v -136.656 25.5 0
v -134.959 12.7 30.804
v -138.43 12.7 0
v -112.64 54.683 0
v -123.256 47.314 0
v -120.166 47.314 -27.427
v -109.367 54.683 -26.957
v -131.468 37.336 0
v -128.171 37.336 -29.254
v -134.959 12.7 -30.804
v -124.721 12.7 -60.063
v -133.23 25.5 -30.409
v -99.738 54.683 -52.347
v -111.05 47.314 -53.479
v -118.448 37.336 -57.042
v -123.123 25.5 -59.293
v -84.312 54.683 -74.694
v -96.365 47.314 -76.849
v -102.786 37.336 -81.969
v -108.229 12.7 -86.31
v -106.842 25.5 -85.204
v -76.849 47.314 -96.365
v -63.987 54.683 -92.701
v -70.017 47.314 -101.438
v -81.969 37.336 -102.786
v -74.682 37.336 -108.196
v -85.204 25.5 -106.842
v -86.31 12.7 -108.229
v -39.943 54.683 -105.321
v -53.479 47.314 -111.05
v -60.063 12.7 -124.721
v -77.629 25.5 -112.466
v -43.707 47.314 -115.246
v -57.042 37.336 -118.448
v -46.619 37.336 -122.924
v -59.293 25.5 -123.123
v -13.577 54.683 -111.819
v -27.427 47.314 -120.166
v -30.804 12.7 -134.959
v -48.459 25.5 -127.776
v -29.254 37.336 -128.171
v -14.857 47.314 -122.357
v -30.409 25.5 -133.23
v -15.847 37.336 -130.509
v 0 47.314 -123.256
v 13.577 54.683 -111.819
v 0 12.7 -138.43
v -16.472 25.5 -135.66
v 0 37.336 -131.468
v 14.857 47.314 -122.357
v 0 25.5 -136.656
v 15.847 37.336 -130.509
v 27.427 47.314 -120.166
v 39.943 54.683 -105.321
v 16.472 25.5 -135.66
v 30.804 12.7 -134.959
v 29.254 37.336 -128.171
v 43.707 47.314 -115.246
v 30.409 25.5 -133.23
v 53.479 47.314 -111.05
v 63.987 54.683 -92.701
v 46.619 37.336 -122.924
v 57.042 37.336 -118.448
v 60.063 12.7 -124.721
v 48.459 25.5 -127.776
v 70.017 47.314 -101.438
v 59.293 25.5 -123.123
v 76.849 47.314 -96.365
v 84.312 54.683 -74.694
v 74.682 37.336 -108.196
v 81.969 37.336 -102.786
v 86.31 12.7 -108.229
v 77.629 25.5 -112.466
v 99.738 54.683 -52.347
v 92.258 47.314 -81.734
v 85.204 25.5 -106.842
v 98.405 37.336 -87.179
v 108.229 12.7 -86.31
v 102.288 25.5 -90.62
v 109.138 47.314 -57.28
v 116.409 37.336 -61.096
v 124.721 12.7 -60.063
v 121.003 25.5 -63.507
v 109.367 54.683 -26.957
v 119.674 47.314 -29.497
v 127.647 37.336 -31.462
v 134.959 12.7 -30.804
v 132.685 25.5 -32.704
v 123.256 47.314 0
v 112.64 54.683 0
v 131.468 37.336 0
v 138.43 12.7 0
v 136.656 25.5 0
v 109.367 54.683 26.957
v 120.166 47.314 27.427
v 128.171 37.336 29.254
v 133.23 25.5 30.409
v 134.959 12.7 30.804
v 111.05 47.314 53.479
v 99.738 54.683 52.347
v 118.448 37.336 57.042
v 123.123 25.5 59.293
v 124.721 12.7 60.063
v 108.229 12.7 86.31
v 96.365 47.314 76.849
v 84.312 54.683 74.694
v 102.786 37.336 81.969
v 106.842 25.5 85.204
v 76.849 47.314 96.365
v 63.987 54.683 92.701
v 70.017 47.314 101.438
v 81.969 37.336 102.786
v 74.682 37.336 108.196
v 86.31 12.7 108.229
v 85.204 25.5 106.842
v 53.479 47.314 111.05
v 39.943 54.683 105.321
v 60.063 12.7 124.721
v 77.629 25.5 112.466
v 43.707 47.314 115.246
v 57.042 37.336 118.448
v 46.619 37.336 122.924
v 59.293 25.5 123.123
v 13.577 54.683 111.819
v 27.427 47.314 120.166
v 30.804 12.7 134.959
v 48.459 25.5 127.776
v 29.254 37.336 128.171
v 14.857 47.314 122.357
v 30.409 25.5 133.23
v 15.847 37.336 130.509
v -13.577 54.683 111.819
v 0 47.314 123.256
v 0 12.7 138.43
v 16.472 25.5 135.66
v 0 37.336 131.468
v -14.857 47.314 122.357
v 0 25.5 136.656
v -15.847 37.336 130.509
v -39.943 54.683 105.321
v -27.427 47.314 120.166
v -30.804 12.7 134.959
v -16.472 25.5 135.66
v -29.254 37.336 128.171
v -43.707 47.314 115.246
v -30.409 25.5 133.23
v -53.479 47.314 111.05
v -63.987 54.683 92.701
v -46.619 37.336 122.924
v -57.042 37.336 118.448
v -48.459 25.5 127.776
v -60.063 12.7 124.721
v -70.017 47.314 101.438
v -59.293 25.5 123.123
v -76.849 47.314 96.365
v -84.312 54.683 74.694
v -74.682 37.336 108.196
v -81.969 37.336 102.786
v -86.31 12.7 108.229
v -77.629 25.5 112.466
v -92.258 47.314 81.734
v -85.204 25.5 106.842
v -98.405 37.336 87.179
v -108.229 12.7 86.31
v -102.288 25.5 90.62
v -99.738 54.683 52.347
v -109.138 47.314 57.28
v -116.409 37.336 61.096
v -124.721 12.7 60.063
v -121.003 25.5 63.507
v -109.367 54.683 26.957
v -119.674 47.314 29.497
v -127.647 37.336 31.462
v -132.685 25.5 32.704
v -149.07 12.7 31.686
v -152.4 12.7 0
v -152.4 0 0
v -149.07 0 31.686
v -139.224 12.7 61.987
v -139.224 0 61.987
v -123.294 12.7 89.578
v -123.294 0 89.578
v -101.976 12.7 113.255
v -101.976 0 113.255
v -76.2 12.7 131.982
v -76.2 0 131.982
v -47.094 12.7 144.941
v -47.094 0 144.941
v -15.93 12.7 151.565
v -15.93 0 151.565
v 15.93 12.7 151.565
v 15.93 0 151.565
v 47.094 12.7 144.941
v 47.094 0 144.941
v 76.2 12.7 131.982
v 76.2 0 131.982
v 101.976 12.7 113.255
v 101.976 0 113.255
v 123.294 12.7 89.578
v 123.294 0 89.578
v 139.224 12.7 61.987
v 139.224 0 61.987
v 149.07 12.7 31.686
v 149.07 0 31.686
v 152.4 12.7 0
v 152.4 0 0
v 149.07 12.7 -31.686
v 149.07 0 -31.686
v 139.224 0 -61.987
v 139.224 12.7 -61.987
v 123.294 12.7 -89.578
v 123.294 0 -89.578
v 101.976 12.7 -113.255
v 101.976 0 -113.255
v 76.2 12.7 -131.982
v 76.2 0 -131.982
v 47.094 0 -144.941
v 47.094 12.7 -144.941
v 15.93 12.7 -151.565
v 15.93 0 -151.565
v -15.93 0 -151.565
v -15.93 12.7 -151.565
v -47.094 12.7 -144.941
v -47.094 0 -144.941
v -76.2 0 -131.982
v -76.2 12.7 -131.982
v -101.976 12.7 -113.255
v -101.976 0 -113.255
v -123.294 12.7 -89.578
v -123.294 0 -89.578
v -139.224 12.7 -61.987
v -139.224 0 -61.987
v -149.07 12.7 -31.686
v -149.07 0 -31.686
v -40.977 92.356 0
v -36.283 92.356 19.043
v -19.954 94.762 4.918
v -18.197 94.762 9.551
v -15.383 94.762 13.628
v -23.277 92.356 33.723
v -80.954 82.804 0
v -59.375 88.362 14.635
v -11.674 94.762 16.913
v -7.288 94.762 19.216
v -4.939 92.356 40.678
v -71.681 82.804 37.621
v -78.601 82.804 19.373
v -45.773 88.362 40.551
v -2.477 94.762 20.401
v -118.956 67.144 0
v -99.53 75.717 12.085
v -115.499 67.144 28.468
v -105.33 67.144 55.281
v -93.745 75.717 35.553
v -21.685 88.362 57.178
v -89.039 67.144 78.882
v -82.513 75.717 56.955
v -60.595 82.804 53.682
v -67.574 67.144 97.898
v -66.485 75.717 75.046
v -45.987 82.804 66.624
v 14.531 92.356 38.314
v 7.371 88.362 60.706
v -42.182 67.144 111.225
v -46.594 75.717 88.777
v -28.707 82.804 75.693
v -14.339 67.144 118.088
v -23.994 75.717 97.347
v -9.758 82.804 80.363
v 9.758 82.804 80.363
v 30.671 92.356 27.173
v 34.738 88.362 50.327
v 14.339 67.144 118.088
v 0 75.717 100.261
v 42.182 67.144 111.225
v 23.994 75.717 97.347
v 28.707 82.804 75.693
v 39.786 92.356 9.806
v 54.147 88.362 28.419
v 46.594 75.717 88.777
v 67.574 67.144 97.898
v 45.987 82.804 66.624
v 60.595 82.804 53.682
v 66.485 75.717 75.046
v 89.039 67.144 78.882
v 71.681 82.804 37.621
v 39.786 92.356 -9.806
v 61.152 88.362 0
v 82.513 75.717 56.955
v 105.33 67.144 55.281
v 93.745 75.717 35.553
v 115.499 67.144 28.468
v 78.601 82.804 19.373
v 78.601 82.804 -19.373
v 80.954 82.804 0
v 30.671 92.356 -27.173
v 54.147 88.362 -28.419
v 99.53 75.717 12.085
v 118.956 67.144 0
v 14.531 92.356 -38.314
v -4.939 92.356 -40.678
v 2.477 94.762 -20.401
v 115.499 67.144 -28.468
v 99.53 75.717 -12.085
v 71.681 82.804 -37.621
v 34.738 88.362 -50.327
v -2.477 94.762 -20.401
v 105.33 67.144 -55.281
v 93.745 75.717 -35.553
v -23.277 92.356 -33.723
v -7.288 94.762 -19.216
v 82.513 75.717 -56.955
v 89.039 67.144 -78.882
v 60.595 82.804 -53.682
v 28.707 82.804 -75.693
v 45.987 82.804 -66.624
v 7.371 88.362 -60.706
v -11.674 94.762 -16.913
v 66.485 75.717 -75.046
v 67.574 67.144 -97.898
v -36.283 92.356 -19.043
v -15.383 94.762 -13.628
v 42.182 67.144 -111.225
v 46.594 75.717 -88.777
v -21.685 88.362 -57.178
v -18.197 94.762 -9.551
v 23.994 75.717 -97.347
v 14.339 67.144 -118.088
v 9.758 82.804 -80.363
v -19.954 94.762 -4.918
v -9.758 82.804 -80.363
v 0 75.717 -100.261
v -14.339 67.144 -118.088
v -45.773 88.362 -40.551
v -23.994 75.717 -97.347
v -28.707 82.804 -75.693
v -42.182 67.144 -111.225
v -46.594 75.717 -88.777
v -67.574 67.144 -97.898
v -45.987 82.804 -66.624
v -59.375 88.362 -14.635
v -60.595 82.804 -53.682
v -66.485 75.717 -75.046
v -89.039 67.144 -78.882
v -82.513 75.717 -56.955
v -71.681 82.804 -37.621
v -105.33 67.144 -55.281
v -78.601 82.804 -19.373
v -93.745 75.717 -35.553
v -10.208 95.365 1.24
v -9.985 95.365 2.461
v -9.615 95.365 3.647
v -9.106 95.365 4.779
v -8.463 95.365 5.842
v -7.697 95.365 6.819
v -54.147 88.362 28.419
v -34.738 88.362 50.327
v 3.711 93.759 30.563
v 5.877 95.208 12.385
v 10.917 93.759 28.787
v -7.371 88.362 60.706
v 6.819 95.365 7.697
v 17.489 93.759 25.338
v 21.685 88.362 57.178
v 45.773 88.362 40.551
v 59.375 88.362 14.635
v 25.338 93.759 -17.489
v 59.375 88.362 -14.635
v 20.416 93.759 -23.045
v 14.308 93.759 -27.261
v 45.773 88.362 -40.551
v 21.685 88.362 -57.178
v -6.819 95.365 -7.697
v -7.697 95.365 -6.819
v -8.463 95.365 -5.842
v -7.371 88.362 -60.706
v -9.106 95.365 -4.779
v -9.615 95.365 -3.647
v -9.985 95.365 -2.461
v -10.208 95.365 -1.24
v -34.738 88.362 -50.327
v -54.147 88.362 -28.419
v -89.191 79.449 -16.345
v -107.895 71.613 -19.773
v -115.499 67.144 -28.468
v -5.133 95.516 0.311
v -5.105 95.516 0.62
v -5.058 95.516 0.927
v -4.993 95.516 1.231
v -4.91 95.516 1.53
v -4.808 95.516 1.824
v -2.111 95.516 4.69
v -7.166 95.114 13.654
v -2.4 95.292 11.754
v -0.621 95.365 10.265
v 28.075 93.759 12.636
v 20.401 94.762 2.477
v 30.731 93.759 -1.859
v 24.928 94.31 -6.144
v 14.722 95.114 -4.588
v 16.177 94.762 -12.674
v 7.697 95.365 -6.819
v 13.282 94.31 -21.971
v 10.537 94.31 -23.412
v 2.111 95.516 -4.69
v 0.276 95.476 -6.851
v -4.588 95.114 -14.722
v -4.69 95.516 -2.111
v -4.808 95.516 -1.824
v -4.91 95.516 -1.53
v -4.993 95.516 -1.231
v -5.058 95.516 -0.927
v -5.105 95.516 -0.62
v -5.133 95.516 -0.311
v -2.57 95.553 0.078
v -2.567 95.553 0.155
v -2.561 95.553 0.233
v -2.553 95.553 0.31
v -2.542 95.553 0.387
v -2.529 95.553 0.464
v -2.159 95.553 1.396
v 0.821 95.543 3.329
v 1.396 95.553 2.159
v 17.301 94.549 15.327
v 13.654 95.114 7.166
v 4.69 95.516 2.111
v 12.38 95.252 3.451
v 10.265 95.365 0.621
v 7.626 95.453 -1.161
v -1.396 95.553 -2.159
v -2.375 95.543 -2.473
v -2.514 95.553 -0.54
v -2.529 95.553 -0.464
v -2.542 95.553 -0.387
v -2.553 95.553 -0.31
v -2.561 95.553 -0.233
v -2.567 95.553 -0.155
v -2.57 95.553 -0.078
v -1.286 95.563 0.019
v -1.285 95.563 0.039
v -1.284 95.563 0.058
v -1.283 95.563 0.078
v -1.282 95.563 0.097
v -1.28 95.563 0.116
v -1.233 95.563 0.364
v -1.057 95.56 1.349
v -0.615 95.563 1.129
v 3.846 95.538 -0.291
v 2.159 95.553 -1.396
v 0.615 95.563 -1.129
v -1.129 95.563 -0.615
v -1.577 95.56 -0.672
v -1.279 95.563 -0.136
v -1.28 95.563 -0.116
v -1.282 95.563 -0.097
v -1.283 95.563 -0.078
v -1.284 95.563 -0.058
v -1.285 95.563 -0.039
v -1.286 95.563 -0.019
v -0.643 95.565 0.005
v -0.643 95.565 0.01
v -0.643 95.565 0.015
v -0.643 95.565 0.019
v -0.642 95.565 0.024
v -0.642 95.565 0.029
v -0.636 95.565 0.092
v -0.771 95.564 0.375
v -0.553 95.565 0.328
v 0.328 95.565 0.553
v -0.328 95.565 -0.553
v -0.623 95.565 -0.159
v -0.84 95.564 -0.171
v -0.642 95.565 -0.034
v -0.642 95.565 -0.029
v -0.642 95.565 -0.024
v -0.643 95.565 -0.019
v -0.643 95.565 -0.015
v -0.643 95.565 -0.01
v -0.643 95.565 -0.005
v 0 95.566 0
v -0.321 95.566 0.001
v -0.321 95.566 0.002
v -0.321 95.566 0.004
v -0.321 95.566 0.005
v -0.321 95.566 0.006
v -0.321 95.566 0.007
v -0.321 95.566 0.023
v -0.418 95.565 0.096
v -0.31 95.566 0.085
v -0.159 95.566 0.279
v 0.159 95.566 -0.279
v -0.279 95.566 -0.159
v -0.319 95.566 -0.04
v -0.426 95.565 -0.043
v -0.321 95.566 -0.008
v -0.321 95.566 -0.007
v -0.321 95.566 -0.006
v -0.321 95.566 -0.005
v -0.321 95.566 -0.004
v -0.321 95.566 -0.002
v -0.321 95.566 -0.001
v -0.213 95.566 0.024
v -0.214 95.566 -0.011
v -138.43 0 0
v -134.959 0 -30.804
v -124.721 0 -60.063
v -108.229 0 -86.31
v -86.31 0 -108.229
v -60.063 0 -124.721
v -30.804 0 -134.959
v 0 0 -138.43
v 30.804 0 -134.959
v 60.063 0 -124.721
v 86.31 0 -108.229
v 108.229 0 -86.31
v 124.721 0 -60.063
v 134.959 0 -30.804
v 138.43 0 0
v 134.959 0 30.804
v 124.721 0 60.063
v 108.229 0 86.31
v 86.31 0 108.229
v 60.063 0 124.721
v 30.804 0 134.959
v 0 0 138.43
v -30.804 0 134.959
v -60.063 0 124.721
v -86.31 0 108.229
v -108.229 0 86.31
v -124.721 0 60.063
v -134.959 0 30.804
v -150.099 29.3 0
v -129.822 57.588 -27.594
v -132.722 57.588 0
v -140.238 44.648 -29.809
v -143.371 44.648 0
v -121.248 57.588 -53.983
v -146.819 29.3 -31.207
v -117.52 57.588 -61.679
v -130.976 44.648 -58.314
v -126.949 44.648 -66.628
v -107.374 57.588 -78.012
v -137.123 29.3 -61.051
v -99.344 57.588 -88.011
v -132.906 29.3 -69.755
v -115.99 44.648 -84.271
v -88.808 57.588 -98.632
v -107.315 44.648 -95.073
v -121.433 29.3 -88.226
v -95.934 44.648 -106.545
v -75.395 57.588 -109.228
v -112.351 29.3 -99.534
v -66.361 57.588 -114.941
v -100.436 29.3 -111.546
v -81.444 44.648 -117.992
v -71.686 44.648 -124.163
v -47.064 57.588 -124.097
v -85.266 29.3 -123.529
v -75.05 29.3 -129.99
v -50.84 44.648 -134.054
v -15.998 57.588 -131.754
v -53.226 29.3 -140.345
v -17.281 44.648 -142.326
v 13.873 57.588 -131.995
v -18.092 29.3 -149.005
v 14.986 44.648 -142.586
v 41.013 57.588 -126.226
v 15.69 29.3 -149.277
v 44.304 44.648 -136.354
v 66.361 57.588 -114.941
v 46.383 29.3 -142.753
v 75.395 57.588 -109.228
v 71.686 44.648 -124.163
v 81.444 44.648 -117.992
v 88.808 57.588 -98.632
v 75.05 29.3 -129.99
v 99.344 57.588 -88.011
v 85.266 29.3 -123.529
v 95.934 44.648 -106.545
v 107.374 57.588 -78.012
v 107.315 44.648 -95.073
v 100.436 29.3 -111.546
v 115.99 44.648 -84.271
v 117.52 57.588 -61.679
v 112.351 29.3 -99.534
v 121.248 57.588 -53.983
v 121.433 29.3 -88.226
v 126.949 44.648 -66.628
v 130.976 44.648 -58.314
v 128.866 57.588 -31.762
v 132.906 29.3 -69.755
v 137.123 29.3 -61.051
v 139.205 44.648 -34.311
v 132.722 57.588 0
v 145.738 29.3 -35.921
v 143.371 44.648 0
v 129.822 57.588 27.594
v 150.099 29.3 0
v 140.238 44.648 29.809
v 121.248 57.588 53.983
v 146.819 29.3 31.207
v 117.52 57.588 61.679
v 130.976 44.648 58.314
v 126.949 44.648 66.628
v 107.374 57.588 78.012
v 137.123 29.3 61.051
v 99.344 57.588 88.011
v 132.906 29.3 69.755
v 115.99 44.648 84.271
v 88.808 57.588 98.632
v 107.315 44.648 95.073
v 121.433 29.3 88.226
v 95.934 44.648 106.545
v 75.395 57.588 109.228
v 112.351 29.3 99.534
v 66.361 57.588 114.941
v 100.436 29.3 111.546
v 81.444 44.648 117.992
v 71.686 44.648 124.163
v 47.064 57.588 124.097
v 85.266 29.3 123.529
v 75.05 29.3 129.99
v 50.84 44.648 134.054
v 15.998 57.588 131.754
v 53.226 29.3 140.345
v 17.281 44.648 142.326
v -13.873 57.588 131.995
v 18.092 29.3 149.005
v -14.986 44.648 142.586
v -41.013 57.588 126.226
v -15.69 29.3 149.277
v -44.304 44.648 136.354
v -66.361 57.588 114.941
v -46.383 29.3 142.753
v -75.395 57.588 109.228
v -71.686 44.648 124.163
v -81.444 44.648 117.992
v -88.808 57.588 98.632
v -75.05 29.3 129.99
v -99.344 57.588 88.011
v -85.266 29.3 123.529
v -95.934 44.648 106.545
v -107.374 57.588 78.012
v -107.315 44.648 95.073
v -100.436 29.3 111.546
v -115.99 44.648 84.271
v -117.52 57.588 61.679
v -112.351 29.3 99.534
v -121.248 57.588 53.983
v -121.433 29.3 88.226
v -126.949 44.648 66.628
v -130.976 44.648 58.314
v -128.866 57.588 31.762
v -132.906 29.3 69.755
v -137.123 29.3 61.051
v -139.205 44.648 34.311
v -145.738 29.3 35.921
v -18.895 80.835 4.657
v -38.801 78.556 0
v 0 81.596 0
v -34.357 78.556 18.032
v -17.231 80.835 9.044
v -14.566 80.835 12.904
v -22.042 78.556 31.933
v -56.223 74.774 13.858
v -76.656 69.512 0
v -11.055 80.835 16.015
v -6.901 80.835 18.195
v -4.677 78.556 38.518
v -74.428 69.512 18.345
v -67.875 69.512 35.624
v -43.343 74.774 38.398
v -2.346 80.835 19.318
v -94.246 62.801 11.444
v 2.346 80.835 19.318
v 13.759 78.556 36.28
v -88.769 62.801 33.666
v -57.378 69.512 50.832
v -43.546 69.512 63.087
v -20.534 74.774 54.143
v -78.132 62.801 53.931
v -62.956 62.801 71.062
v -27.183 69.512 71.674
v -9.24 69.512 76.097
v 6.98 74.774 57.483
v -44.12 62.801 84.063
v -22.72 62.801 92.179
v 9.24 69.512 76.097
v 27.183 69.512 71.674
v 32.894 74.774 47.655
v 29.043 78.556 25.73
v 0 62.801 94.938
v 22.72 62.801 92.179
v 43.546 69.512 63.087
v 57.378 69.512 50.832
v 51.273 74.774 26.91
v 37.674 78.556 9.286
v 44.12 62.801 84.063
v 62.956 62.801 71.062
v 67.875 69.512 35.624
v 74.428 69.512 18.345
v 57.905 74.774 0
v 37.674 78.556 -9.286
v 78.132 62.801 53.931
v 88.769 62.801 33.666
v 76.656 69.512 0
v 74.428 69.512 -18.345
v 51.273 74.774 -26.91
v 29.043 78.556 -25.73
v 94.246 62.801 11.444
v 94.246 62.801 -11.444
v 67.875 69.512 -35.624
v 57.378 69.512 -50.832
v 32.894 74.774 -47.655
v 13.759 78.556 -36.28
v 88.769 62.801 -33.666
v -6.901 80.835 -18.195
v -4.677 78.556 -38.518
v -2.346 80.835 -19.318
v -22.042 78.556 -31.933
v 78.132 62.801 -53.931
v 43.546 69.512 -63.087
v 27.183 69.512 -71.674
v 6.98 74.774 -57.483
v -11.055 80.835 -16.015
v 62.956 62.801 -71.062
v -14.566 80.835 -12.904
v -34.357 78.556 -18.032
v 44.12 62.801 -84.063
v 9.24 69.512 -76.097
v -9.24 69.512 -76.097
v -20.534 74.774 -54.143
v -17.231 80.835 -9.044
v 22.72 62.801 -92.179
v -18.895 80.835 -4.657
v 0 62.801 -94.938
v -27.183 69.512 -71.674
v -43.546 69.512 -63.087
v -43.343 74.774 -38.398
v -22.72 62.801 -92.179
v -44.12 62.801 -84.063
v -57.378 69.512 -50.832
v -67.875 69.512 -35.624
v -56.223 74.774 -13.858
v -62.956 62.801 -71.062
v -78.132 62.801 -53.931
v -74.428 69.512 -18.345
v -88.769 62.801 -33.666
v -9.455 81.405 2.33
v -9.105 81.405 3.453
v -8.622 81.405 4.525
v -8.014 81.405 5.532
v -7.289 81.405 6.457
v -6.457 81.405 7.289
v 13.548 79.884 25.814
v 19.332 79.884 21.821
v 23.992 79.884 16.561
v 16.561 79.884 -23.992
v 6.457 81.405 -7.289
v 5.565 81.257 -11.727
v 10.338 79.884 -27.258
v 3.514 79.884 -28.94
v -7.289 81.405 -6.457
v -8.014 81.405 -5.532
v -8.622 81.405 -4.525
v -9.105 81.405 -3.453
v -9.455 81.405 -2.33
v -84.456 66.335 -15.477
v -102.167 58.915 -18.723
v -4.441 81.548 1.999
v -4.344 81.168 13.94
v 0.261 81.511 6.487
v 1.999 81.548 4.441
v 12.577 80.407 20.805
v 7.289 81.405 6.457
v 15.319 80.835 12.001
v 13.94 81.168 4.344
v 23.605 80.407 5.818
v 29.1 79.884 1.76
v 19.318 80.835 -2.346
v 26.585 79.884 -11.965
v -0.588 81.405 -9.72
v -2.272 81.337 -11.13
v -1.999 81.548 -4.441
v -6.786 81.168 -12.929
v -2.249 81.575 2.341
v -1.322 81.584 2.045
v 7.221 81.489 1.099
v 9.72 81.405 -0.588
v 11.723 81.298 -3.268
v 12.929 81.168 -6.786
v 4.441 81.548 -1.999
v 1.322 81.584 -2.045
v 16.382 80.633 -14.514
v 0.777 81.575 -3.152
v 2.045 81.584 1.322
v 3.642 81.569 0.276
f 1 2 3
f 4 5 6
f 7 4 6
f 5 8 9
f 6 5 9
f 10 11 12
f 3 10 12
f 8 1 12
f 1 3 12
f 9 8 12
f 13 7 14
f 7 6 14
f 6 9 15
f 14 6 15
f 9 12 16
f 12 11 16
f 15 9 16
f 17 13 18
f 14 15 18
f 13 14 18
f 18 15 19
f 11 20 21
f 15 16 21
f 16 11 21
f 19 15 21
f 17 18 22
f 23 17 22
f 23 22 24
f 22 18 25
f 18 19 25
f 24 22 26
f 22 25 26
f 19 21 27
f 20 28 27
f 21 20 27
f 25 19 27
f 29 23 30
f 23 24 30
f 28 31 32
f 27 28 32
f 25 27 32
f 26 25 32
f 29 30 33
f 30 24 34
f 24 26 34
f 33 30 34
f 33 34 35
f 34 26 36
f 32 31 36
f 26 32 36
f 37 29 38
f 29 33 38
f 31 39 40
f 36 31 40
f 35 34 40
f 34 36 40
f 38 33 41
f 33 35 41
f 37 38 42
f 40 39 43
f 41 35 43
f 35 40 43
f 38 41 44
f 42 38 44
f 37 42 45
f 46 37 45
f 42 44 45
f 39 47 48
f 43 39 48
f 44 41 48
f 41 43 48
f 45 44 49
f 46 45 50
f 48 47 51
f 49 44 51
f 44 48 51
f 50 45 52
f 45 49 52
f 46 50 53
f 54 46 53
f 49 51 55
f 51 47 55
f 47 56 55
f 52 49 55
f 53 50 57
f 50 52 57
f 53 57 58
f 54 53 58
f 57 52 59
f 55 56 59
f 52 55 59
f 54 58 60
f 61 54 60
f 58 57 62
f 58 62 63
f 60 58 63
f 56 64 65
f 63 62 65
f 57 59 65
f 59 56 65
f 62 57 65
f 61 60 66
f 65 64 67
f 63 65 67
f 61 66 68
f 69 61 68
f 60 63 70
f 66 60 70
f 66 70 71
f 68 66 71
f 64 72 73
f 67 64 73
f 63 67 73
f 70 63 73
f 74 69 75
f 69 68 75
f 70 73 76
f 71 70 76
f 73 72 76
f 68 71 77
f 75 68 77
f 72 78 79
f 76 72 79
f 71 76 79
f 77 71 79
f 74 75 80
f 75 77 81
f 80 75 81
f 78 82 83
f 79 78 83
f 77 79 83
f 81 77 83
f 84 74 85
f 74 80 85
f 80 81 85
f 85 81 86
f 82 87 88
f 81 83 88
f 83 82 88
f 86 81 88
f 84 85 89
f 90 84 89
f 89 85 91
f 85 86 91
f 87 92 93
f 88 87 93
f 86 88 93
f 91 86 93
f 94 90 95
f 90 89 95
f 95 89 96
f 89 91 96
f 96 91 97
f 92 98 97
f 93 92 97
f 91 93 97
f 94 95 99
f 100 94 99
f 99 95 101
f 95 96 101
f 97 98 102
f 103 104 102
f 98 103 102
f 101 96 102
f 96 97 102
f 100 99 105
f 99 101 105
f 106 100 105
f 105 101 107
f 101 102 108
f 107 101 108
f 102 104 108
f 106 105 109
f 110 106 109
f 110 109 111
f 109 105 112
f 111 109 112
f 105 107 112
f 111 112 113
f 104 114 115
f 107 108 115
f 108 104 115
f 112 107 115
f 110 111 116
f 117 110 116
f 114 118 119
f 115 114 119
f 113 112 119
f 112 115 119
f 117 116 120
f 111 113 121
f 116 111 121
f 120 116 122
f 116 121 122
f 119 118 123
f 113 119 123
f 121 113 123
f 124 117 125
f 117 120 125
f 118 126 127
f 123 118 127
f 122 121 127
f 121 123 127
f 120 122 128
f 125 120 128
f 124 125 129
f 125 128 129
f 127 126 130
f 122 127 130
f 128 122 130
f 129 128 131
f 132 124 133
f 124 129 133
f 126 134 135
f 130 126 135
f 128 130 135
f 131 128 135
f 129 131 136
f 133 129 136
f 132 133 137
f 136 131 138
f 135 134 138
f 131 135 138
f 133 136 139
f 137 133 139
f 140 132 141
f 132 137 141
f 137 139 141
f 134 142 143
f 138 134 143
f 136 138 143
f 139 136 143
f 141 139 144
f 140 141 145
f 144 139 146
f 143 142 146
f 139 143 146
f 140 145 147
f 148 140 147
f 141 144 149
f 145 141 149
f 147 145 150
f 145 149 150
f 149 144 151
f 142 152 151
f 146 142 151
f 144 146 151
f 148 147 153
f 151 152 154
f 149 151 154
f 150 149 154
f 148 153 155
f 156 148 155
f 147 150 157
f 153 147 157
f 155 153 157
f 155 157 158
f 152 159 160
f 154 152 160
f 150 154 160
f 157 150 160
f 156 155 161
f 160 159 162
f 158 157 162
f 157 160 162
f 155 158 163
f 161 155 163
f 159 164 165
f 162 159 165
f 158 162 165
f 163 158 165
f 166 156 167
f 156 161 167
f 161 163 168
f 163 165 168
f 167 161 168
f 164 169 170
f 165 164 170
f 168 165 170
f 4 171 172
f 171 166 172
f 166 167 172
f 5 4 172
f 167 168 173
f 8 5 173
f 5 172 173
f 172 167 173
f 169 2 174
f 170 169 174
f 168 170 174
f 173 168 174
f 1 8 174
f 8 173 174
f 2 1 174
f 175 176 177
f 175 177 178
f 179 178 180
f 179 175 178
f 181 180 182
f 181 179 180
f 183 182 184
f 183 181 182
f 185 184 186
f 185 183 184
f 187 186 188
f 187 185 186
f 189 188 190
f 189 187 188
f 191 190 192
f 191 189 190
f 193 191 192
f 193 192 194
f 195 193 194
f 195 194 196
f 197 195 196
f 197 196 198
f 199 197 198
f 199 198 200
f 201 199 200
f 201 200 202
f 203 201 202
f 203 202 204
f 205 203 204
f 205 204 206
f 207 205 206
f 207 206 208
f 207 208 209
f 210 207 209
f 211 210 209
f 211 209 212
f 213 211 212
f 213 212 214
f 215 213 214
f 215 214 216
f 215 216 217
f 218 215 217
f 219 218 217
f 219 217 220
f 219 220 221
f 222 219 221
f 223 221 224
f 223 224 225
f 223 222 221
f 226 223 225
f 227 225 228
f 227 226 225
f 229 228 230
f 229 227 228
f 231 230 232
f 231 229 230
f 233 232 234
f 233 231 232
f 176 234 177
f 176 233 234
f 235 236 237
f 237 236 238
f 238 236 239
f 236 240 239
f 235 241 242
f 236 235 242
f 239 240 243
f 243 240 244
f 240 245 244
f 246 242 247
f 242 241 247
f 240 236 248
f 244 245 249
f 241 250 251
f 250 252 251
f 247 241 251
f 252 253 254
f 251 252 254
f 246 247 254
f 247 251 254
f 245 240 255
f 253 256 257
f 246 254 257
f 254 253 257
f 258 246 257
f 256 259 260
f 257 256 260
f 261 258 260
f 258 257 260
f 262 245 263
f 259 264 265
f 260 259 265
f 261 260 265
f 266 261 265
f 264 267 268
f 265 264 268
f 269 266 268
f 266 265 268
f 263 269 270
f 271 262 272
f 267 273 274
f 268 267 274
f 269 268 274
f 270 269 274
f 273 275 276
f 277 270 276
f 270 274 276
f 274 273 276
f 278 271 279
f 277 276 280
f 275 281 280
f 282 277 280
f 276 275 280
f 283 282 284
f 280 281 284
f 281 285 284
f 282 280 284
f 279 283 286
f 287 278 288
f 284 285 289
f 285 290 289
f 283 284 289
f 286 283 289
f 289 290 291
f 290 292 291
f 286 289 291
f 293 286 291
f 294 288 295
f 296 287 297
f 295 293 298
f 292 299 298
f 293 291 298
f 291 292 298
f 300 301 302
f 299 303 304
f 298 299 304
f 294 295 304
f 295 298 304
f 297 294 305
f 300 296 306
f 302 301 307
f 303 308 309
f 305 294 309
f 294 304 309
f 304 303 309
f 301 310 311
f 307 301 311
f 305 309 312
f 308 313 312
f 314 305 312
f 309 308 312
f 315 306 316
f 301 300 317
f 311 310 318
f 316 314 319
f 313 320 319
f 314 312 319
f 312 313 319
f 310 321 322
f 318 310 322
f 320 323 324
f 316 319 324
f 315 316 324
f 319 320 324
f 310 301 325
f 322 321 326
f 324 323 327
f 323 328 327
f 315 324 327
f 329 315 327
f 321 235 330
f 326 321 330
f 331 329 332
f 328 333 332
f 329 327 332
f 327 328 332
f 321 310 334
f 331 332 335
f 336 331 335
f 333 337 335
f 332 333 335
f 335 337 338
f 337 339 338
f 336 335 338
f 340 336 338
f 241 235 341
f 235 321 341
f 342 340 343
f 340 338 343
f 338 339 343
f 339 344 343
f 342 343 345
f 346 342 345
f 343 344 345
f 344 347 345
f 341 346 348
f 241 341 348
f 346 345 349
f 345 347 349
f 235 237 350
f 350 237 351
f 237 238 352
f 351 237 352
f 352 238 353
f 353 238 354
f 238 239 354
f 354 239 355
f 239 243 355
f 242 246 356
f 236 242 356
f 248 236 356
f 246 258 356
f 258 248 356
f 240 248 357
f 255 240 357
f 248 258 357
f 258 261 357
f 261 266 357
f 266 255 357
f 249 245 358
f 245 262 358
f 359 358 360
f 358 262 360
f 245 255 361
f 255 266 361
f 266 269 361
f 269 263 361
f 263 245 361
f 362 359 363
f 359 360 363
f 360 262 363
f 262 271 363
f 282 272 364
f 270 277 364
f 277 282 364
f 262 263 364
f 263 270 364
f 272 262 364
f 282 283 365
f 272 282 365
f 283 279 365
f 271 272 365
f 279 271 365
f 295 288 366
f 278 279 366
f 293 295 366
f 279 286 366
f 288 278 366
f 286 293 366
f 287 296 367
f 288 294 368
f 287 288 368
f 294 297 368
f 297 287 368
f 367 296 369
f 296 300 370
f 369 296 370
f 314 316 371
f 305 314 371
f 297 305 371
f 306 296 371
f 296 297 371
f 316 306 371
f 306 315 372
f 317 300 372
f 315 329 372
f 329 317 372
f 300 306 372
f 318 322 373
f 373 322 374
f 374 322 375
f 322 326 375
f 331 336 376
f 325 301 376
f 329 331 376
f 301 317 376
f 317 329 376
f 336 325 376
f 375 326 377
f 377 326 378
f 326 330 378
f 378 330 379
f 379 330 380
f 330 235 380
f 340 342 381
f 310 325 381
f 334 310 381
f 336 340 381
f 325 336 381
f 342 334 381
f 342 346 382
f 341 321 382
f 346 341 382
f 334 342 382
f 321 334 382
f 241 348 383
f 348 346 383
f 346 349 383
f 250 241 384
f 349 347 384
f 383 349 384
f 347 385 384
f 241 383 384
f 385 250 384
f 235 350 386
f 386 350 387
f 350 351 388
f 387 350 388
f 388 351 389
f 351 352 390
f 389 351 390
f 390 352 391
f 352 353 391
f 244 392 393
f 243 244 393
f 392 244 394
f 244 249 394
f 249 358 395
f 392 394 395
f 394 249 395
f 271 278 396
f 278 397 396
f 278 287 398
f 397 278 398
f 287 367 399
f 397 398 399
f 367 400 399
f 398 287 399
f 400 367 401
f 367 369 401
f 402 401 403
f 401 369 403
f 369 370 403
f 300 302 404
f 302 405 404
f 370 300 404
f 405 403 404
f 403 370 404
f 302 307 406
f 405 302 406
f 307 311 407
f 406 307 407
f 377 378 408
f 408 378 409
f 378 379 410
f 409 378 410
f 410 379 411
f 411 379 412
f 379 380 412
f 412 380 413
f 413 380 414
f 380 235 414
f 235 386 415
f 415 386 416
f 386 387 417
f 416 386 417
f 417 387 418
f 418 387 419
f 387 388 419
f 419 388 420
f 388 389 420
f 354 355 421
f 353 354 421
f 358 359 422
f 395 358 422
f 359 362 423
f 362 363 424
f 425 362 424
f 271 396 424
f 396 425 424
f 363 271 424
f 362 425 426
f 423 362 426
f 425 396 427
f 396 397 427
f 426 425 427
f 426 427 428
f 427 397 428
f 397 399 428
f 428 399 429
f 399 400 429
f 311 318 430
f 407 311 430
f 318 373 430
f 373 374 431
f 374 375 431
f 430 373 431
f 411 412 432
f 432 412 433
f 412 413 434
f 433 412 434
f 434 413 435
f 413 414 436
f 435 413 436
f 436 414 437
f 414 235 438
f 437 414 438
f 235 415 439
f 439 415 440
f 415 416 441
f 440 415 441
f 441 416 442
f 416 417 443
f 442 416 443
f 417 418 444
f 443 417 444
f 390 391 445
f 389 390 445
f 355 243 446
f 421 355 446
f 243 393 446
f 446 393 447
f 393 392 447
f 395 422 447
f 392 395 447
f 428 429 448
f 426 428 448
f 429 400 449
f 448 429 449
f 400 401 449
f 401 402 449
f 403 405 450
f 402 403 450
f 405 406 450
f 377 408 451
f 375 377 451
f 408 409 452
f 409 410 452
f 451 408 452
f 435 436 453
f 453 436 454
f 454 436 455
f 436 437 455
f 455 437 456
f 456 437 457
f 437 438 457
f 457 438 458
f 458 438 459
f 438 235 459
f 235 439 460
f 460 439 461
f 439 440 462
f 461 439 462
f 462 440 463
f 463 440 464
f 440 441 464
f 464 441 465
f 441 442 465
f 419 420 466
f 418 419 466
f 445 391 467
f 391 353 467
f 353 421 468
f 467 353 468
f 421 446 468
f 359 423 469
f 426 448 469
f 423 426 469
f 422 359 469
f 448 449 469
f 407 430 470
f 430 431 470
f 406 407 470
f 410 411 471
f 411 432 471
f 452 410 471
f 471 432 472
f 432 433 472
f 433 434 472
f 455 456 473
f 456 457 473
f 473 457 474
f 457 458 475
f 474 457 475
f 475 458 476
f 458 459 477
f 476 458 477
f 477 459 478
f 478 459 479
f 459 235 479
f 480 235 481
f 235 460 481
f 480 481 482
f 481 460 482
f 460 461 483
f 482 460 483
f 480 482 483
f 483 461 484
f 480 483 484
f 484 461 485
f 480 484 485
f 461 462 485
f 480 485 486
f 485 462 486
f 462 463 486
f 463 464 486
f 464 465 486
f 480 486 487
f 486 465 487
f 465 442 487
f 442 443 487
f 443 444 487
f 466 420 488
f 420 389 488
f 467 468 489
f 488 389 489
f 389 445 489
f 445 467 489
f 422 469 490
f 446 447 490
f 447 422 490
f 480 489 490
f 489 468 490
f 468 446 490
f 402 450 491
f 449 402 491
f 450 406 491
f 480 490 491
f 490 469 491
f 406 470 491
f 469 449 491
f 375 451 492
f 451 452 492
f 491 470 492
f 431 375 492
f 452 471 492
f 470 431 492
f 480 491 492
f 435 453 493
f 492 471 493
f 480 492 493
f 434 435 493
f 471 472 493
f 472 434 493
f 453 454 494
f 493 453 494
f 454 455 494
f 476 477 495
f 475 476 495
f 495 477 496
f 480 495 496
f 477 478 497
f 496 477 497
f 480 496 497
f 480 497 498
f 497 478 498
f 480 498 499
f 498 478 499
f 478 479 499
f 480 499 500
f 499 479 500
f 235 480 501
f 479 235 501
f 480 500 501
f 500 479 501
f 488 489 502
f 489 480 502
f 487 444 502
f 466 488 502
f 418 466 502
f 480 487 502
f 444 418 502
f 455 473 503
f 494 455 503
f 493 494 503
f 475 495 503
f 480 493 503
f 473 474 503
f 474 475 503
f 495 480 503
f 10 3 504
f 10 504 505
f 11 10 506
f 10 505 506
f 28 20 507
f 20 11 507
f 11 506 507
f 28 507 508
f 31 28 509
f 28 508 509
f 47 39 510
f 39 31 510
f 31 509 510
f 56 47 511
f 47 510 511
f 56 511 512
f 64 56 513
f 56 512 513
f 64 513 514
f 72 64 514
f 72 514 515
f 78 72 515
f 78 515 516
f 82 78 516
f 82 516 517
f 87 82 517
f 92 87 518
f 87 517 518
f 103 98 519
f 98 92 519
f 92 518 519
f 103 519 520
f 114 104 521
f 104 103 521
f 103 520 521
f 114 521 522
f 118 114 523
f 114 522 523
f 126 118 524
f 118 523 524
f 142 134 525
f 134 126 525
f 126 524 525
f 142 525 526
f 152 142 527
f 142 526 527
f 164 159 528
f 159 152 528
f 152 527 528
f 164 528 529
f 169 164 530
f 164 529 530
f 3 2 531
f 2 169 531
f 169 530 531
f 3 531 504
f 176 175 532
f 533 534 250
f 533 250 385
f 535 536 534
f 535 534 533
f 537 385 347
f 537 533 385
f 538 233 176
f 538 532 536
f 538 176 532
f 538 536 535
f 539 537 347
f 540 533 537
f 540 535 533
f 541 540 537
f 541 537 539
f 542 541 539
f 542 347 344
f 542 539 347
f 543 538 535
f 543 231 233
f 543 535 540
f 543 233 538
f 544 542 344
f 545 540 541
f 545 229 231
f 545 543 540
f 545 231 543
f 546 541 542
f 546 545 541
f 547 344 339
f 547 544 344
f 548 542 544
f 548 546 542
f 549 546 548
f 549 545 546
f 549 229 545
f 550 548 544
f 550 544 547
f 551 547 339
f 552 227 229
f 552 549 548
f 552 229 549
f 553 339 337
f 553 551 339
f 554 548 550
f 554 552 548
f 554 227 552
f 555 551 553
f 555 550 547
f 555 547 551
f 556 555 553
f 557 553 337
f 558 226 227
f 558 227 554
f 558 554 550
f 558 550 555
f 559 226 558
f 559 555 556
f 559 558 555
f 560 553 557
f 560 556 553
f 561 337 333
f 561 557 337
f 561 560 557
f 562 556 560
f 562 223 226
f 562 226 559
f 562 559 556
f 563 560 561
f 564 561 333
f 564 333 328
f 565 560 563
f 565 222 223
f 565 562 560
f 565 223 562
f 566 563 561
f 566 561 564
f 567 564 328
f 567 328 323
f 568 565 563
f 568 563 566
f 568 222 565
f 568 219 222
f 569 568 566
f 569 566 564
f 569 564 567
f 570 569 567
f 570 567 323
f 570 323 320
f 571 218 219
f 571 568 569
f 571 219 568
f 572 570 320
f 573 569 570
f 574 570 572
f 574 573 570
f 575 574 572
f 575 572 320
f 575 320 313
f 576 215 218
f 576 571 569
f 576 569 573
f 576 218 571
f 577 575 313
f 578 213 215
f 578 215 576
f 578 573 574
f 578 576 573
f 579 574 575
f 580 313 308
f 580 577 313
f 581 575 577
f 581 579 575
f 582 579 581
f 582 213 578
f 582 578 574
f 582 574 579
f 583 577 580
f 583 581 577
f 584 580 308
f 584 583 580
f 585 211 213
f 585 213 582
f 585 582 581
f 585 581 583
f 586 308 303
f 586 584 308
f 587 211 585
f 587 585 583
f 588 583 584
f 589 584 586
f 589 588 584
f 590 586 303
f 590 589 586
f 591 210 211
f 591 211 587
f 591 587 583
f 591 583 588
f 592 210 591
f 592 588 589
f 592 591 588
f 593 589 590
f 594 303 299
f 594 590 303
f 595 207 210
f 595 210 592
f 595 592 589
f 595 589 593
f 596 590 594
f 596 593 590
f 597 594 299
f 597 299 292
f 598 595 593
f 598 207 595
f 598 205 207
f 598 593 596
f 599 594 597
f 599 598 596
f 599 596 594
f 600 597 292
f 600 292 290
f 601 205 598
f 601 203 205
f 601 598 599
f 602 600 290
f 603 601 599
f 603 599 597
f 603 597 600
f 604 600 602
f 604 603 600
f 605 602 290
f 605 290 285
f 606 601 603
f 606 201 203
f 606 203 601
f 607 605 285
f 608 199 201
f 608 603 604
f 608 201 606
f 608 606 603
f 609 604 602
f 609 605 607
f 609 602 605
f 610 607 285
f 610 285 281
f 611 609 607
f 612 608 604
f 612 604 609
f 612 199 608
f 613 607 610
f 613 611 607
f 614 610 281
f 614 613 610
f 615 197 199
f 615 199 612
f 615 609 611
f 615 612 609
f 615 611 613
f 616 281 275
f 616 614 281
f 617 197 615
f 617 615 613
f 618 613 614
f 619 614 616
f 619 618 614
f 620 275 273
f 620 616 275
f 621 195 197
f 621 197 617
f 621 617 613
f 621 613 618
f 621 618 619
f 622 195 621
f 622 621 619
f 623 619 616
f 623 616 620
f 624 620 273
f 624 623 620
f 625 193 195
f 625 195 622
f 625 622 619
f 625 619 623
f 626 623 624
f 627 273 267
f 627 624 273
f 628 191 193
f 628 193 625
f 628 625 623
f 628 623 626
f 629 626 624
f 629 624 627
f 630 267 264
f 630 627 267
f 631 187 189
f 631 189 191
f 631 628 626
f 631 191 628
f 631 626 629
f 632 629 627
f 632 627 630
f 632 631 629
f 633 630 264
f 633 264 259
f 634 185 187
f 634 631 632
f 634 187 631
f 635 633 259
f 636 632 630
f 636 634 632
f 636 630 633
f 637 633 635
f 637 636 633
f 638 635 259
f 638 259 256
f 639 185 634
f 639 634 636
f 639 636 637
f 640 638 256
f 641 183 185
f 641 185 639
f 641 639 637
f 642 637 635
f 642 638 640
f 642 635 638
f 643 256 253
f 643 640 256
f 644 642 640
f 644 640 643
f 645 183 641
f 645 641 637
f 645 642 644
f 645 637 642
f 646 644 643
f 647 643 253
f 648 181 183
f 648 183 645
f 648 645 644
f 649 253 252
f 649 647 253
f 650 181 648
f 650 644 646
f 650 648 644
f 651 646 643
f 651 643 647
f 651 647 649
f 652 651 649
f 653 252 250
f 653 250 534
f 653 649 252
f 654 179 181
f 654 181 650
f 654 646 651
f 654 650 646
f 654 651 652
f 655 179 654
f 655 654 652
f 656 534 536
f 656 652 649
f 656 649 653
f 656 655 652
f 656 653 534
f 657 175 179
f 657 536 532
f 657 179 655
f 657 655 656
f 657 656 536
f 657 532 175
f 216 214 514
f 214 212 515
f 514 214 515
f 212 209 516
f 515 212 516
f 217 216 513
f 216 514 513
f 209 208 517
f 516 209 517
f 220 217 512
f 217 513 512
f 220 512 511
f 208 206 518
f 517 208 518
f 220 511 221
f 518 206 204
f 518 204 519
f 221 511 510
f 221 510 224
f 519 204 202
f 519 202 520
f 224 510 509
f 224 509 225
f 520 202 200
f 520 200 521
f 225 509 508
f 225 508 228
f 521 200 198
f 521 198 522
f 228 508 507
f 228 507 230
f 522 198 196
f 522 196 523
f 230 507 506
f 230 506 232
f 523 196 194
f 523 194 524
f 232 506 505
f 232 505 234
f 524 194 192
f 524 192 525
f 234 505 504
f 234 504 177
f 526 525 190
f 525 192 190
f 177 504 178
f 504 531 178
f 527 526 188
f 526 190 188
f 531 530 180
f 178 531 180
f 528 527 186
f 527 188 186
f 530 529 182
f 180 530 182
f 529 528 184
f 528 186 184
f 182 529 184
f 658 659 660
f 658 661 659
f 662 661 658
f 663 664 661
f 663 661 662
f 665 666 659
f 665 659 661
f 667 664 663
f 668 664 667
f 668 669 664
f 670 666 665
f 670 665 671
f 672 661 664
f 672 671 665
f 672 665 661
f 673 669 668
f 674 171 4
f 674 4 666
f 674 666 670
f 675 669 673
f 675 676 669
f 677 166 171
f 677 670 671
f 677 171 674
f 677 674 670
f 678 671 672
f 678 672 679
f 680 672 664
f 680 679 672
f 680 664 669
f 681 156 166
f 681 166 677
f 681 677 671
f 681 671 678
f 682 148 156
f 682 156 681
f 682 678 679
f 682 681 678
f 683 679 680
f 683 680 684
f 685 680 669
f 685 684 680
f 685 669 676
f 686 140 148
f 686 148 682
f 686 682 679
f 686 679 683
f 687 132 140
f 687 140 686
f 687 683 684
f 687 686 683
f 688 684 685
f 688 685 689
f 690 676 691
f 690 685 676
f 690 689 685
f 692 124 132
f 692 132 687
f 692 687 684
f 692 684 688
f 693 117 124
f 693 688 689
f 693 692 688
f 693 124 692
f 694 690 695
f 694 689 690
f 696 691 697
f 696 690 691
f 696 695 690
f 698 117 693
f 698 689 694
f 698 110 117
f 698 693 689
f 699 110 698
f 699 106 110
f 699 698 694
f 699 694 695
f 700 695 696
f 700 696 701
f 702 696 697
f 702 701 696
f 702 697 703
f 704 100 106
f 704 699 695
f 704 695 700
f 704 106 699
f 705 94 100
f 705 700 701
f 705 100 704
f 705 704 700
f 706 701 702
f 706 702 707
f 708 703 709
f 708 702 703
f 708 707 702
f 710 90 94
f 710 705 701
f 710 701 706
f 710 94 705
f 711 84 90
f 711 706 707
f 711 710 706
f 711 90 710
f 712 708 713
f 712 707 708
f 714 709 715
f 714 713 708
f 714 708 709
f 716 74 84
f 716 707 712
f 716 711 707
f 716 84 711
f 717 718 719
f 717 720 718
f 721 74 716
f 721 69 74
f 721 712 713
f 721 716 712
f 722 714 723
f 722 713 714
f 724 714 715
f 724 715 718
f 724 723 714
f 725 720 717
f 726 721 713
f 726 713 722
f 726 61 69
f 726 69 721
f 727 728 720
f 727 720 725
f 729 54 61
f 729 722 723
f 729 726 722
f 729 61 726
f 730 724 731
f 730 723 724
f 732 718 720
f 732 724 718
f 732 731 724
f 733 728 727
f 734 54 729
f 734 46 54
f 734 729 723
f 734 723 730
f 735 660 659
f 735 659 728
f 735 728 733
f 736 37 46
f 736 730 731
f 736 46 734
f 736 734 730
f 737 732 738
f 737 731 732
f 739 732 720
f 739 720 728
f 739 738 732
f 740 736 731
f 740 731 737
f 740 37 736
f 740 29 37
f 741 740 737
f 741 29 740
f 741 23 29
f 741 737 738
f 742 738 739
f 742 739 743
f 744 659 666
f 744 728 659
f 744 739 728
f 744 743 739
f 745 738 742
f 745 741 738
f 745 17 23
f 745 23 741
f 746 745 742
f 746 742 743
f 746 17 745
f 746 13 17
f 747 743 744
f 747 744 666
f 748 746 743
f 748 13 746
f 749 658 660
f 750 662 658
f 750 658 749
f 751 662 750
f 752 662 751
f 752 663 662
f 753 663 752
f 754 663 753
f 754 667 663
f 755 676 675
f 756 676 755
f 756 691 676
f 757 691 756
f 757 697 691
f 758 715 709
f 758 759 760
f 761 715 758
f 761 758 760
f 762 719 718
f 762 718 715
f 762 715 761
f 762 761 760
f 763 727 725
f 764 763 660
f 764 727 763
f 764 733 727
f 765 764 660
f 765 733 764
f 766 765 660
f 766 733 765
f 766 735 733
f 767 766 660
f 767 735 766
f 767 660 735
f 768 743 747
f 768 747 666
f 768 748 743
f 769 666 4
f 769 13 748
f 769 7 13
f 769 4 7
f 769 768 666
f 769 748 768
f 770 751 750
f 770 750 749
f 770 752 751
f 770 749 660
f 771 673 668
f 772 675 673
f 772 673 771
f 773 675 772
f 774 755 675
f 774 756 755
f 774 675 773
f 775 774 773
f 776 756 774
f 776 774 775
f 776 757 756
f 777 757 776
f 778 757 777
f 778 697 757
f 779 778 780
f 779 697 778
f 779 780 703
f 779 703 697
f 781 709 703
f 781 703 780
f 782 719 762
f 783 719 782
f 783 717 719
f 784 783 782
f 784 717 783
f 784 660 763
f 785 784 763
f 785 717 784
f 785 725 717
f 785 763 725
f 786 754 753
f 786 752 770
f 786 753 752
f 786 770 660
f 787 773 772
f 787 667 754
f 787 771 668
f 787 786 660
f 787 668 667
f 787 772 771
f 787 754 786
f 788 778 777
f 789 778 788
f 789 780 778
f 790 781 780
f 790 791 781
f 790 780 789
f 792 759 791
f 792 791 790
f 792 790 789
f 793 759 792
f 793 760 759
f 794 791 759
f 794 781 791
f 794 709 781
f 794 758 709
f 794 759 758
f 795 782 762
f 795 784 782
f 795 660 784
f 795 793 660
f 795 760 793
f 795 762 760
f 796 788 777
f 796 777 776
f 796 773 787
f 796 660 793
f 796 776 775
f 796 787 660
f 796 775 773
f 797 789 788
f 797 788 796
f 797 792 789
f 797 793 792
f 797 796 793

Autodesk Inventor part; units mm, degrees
ref_plane "YZ Plane" through (0, 0, 0) normal (1, 0, 0) x (0, 1, 0)
ref_plane "XZ Plane" through (0, 0, 0) normal (0, 1, 0) x (-1, 0, 0)
ref_plane "XY Plane" through (0, 0, 0) normal (0, 0, 1) x (1, 0, 0)
sketch "Sketch1" plane through (0, 0, 0) normal (0, 0, 1) x (1, 0, 0)
  arc A0 (0, 81.5958) -> (-112.6403, 54.6826) centre (0, -167.5782) ccw
  arc A1 (-112.6403, 54.6826) -> (-138.43, 12.7) centre (-91.3638, 12.7) ccw
  line L0 (-138.43, 12.7) -> (-138.43, 0)
  line L1 (-138.43, 0) -> (-152.4, 0)
  line L2 (-152.4, 0) -> (-152.4, 12.7)
  line L3 (0, 95.5658) -> (0, 81.5958)
  line L4 (0, -221.6084) -> (0, 156.6029) projected
  line L5 (-182.0818, 12.7) -> (-119.4588, 12.7) construction
  line L6 (-218.4982, 0) -> (36.4164, 0) projected
  arc A2 (-118.9555, 67.1437) -> (-152.4, 12.7) centre (-91.3638, 12.7) ccw
  arc A3 (0, 95.5658) -> (-118.9555, 67.1437) centre (0, -167.5782) ccw
  point P0 (-145.415, 0)
  dimension "Inner_D" = 138.43
  dimension "Thickness" = 13.97
  dimension "Skirt_Length" = 12.7
  dimension "Knuckle" = 47.0662
  dimension "Crown" = 249.174
  dimension "Thickness_Top" = 13.97
  dimension "Outside_Knuckle" = 61.0362
revolve "Revolution2" add sketch "Sketch1" angle 360 about axis through (0, -10, 0) along (0, 1, 0) contours A0 A1 L0 L1 L2 A2 A3 L3
equation "\"Thickness\" = Outlet_Cap_Wall_Thickness"
equation "\"Skirt_Length\" = Outlet_Cap_Skirt_Length"
equation "\"Knuckle\" = Outlet_Cap_Knuckle_Radius"
equation "\"Outlet_Cap_Wall_Thickness\" = 13.97"
equation "\"Outlet_Cap_Knuckle_Radius\" = 47.0662"
equation "\"Outlet_Cap_Skirt_Length\" = 12.7"
properties part number "Fuel Cap Outlet"
